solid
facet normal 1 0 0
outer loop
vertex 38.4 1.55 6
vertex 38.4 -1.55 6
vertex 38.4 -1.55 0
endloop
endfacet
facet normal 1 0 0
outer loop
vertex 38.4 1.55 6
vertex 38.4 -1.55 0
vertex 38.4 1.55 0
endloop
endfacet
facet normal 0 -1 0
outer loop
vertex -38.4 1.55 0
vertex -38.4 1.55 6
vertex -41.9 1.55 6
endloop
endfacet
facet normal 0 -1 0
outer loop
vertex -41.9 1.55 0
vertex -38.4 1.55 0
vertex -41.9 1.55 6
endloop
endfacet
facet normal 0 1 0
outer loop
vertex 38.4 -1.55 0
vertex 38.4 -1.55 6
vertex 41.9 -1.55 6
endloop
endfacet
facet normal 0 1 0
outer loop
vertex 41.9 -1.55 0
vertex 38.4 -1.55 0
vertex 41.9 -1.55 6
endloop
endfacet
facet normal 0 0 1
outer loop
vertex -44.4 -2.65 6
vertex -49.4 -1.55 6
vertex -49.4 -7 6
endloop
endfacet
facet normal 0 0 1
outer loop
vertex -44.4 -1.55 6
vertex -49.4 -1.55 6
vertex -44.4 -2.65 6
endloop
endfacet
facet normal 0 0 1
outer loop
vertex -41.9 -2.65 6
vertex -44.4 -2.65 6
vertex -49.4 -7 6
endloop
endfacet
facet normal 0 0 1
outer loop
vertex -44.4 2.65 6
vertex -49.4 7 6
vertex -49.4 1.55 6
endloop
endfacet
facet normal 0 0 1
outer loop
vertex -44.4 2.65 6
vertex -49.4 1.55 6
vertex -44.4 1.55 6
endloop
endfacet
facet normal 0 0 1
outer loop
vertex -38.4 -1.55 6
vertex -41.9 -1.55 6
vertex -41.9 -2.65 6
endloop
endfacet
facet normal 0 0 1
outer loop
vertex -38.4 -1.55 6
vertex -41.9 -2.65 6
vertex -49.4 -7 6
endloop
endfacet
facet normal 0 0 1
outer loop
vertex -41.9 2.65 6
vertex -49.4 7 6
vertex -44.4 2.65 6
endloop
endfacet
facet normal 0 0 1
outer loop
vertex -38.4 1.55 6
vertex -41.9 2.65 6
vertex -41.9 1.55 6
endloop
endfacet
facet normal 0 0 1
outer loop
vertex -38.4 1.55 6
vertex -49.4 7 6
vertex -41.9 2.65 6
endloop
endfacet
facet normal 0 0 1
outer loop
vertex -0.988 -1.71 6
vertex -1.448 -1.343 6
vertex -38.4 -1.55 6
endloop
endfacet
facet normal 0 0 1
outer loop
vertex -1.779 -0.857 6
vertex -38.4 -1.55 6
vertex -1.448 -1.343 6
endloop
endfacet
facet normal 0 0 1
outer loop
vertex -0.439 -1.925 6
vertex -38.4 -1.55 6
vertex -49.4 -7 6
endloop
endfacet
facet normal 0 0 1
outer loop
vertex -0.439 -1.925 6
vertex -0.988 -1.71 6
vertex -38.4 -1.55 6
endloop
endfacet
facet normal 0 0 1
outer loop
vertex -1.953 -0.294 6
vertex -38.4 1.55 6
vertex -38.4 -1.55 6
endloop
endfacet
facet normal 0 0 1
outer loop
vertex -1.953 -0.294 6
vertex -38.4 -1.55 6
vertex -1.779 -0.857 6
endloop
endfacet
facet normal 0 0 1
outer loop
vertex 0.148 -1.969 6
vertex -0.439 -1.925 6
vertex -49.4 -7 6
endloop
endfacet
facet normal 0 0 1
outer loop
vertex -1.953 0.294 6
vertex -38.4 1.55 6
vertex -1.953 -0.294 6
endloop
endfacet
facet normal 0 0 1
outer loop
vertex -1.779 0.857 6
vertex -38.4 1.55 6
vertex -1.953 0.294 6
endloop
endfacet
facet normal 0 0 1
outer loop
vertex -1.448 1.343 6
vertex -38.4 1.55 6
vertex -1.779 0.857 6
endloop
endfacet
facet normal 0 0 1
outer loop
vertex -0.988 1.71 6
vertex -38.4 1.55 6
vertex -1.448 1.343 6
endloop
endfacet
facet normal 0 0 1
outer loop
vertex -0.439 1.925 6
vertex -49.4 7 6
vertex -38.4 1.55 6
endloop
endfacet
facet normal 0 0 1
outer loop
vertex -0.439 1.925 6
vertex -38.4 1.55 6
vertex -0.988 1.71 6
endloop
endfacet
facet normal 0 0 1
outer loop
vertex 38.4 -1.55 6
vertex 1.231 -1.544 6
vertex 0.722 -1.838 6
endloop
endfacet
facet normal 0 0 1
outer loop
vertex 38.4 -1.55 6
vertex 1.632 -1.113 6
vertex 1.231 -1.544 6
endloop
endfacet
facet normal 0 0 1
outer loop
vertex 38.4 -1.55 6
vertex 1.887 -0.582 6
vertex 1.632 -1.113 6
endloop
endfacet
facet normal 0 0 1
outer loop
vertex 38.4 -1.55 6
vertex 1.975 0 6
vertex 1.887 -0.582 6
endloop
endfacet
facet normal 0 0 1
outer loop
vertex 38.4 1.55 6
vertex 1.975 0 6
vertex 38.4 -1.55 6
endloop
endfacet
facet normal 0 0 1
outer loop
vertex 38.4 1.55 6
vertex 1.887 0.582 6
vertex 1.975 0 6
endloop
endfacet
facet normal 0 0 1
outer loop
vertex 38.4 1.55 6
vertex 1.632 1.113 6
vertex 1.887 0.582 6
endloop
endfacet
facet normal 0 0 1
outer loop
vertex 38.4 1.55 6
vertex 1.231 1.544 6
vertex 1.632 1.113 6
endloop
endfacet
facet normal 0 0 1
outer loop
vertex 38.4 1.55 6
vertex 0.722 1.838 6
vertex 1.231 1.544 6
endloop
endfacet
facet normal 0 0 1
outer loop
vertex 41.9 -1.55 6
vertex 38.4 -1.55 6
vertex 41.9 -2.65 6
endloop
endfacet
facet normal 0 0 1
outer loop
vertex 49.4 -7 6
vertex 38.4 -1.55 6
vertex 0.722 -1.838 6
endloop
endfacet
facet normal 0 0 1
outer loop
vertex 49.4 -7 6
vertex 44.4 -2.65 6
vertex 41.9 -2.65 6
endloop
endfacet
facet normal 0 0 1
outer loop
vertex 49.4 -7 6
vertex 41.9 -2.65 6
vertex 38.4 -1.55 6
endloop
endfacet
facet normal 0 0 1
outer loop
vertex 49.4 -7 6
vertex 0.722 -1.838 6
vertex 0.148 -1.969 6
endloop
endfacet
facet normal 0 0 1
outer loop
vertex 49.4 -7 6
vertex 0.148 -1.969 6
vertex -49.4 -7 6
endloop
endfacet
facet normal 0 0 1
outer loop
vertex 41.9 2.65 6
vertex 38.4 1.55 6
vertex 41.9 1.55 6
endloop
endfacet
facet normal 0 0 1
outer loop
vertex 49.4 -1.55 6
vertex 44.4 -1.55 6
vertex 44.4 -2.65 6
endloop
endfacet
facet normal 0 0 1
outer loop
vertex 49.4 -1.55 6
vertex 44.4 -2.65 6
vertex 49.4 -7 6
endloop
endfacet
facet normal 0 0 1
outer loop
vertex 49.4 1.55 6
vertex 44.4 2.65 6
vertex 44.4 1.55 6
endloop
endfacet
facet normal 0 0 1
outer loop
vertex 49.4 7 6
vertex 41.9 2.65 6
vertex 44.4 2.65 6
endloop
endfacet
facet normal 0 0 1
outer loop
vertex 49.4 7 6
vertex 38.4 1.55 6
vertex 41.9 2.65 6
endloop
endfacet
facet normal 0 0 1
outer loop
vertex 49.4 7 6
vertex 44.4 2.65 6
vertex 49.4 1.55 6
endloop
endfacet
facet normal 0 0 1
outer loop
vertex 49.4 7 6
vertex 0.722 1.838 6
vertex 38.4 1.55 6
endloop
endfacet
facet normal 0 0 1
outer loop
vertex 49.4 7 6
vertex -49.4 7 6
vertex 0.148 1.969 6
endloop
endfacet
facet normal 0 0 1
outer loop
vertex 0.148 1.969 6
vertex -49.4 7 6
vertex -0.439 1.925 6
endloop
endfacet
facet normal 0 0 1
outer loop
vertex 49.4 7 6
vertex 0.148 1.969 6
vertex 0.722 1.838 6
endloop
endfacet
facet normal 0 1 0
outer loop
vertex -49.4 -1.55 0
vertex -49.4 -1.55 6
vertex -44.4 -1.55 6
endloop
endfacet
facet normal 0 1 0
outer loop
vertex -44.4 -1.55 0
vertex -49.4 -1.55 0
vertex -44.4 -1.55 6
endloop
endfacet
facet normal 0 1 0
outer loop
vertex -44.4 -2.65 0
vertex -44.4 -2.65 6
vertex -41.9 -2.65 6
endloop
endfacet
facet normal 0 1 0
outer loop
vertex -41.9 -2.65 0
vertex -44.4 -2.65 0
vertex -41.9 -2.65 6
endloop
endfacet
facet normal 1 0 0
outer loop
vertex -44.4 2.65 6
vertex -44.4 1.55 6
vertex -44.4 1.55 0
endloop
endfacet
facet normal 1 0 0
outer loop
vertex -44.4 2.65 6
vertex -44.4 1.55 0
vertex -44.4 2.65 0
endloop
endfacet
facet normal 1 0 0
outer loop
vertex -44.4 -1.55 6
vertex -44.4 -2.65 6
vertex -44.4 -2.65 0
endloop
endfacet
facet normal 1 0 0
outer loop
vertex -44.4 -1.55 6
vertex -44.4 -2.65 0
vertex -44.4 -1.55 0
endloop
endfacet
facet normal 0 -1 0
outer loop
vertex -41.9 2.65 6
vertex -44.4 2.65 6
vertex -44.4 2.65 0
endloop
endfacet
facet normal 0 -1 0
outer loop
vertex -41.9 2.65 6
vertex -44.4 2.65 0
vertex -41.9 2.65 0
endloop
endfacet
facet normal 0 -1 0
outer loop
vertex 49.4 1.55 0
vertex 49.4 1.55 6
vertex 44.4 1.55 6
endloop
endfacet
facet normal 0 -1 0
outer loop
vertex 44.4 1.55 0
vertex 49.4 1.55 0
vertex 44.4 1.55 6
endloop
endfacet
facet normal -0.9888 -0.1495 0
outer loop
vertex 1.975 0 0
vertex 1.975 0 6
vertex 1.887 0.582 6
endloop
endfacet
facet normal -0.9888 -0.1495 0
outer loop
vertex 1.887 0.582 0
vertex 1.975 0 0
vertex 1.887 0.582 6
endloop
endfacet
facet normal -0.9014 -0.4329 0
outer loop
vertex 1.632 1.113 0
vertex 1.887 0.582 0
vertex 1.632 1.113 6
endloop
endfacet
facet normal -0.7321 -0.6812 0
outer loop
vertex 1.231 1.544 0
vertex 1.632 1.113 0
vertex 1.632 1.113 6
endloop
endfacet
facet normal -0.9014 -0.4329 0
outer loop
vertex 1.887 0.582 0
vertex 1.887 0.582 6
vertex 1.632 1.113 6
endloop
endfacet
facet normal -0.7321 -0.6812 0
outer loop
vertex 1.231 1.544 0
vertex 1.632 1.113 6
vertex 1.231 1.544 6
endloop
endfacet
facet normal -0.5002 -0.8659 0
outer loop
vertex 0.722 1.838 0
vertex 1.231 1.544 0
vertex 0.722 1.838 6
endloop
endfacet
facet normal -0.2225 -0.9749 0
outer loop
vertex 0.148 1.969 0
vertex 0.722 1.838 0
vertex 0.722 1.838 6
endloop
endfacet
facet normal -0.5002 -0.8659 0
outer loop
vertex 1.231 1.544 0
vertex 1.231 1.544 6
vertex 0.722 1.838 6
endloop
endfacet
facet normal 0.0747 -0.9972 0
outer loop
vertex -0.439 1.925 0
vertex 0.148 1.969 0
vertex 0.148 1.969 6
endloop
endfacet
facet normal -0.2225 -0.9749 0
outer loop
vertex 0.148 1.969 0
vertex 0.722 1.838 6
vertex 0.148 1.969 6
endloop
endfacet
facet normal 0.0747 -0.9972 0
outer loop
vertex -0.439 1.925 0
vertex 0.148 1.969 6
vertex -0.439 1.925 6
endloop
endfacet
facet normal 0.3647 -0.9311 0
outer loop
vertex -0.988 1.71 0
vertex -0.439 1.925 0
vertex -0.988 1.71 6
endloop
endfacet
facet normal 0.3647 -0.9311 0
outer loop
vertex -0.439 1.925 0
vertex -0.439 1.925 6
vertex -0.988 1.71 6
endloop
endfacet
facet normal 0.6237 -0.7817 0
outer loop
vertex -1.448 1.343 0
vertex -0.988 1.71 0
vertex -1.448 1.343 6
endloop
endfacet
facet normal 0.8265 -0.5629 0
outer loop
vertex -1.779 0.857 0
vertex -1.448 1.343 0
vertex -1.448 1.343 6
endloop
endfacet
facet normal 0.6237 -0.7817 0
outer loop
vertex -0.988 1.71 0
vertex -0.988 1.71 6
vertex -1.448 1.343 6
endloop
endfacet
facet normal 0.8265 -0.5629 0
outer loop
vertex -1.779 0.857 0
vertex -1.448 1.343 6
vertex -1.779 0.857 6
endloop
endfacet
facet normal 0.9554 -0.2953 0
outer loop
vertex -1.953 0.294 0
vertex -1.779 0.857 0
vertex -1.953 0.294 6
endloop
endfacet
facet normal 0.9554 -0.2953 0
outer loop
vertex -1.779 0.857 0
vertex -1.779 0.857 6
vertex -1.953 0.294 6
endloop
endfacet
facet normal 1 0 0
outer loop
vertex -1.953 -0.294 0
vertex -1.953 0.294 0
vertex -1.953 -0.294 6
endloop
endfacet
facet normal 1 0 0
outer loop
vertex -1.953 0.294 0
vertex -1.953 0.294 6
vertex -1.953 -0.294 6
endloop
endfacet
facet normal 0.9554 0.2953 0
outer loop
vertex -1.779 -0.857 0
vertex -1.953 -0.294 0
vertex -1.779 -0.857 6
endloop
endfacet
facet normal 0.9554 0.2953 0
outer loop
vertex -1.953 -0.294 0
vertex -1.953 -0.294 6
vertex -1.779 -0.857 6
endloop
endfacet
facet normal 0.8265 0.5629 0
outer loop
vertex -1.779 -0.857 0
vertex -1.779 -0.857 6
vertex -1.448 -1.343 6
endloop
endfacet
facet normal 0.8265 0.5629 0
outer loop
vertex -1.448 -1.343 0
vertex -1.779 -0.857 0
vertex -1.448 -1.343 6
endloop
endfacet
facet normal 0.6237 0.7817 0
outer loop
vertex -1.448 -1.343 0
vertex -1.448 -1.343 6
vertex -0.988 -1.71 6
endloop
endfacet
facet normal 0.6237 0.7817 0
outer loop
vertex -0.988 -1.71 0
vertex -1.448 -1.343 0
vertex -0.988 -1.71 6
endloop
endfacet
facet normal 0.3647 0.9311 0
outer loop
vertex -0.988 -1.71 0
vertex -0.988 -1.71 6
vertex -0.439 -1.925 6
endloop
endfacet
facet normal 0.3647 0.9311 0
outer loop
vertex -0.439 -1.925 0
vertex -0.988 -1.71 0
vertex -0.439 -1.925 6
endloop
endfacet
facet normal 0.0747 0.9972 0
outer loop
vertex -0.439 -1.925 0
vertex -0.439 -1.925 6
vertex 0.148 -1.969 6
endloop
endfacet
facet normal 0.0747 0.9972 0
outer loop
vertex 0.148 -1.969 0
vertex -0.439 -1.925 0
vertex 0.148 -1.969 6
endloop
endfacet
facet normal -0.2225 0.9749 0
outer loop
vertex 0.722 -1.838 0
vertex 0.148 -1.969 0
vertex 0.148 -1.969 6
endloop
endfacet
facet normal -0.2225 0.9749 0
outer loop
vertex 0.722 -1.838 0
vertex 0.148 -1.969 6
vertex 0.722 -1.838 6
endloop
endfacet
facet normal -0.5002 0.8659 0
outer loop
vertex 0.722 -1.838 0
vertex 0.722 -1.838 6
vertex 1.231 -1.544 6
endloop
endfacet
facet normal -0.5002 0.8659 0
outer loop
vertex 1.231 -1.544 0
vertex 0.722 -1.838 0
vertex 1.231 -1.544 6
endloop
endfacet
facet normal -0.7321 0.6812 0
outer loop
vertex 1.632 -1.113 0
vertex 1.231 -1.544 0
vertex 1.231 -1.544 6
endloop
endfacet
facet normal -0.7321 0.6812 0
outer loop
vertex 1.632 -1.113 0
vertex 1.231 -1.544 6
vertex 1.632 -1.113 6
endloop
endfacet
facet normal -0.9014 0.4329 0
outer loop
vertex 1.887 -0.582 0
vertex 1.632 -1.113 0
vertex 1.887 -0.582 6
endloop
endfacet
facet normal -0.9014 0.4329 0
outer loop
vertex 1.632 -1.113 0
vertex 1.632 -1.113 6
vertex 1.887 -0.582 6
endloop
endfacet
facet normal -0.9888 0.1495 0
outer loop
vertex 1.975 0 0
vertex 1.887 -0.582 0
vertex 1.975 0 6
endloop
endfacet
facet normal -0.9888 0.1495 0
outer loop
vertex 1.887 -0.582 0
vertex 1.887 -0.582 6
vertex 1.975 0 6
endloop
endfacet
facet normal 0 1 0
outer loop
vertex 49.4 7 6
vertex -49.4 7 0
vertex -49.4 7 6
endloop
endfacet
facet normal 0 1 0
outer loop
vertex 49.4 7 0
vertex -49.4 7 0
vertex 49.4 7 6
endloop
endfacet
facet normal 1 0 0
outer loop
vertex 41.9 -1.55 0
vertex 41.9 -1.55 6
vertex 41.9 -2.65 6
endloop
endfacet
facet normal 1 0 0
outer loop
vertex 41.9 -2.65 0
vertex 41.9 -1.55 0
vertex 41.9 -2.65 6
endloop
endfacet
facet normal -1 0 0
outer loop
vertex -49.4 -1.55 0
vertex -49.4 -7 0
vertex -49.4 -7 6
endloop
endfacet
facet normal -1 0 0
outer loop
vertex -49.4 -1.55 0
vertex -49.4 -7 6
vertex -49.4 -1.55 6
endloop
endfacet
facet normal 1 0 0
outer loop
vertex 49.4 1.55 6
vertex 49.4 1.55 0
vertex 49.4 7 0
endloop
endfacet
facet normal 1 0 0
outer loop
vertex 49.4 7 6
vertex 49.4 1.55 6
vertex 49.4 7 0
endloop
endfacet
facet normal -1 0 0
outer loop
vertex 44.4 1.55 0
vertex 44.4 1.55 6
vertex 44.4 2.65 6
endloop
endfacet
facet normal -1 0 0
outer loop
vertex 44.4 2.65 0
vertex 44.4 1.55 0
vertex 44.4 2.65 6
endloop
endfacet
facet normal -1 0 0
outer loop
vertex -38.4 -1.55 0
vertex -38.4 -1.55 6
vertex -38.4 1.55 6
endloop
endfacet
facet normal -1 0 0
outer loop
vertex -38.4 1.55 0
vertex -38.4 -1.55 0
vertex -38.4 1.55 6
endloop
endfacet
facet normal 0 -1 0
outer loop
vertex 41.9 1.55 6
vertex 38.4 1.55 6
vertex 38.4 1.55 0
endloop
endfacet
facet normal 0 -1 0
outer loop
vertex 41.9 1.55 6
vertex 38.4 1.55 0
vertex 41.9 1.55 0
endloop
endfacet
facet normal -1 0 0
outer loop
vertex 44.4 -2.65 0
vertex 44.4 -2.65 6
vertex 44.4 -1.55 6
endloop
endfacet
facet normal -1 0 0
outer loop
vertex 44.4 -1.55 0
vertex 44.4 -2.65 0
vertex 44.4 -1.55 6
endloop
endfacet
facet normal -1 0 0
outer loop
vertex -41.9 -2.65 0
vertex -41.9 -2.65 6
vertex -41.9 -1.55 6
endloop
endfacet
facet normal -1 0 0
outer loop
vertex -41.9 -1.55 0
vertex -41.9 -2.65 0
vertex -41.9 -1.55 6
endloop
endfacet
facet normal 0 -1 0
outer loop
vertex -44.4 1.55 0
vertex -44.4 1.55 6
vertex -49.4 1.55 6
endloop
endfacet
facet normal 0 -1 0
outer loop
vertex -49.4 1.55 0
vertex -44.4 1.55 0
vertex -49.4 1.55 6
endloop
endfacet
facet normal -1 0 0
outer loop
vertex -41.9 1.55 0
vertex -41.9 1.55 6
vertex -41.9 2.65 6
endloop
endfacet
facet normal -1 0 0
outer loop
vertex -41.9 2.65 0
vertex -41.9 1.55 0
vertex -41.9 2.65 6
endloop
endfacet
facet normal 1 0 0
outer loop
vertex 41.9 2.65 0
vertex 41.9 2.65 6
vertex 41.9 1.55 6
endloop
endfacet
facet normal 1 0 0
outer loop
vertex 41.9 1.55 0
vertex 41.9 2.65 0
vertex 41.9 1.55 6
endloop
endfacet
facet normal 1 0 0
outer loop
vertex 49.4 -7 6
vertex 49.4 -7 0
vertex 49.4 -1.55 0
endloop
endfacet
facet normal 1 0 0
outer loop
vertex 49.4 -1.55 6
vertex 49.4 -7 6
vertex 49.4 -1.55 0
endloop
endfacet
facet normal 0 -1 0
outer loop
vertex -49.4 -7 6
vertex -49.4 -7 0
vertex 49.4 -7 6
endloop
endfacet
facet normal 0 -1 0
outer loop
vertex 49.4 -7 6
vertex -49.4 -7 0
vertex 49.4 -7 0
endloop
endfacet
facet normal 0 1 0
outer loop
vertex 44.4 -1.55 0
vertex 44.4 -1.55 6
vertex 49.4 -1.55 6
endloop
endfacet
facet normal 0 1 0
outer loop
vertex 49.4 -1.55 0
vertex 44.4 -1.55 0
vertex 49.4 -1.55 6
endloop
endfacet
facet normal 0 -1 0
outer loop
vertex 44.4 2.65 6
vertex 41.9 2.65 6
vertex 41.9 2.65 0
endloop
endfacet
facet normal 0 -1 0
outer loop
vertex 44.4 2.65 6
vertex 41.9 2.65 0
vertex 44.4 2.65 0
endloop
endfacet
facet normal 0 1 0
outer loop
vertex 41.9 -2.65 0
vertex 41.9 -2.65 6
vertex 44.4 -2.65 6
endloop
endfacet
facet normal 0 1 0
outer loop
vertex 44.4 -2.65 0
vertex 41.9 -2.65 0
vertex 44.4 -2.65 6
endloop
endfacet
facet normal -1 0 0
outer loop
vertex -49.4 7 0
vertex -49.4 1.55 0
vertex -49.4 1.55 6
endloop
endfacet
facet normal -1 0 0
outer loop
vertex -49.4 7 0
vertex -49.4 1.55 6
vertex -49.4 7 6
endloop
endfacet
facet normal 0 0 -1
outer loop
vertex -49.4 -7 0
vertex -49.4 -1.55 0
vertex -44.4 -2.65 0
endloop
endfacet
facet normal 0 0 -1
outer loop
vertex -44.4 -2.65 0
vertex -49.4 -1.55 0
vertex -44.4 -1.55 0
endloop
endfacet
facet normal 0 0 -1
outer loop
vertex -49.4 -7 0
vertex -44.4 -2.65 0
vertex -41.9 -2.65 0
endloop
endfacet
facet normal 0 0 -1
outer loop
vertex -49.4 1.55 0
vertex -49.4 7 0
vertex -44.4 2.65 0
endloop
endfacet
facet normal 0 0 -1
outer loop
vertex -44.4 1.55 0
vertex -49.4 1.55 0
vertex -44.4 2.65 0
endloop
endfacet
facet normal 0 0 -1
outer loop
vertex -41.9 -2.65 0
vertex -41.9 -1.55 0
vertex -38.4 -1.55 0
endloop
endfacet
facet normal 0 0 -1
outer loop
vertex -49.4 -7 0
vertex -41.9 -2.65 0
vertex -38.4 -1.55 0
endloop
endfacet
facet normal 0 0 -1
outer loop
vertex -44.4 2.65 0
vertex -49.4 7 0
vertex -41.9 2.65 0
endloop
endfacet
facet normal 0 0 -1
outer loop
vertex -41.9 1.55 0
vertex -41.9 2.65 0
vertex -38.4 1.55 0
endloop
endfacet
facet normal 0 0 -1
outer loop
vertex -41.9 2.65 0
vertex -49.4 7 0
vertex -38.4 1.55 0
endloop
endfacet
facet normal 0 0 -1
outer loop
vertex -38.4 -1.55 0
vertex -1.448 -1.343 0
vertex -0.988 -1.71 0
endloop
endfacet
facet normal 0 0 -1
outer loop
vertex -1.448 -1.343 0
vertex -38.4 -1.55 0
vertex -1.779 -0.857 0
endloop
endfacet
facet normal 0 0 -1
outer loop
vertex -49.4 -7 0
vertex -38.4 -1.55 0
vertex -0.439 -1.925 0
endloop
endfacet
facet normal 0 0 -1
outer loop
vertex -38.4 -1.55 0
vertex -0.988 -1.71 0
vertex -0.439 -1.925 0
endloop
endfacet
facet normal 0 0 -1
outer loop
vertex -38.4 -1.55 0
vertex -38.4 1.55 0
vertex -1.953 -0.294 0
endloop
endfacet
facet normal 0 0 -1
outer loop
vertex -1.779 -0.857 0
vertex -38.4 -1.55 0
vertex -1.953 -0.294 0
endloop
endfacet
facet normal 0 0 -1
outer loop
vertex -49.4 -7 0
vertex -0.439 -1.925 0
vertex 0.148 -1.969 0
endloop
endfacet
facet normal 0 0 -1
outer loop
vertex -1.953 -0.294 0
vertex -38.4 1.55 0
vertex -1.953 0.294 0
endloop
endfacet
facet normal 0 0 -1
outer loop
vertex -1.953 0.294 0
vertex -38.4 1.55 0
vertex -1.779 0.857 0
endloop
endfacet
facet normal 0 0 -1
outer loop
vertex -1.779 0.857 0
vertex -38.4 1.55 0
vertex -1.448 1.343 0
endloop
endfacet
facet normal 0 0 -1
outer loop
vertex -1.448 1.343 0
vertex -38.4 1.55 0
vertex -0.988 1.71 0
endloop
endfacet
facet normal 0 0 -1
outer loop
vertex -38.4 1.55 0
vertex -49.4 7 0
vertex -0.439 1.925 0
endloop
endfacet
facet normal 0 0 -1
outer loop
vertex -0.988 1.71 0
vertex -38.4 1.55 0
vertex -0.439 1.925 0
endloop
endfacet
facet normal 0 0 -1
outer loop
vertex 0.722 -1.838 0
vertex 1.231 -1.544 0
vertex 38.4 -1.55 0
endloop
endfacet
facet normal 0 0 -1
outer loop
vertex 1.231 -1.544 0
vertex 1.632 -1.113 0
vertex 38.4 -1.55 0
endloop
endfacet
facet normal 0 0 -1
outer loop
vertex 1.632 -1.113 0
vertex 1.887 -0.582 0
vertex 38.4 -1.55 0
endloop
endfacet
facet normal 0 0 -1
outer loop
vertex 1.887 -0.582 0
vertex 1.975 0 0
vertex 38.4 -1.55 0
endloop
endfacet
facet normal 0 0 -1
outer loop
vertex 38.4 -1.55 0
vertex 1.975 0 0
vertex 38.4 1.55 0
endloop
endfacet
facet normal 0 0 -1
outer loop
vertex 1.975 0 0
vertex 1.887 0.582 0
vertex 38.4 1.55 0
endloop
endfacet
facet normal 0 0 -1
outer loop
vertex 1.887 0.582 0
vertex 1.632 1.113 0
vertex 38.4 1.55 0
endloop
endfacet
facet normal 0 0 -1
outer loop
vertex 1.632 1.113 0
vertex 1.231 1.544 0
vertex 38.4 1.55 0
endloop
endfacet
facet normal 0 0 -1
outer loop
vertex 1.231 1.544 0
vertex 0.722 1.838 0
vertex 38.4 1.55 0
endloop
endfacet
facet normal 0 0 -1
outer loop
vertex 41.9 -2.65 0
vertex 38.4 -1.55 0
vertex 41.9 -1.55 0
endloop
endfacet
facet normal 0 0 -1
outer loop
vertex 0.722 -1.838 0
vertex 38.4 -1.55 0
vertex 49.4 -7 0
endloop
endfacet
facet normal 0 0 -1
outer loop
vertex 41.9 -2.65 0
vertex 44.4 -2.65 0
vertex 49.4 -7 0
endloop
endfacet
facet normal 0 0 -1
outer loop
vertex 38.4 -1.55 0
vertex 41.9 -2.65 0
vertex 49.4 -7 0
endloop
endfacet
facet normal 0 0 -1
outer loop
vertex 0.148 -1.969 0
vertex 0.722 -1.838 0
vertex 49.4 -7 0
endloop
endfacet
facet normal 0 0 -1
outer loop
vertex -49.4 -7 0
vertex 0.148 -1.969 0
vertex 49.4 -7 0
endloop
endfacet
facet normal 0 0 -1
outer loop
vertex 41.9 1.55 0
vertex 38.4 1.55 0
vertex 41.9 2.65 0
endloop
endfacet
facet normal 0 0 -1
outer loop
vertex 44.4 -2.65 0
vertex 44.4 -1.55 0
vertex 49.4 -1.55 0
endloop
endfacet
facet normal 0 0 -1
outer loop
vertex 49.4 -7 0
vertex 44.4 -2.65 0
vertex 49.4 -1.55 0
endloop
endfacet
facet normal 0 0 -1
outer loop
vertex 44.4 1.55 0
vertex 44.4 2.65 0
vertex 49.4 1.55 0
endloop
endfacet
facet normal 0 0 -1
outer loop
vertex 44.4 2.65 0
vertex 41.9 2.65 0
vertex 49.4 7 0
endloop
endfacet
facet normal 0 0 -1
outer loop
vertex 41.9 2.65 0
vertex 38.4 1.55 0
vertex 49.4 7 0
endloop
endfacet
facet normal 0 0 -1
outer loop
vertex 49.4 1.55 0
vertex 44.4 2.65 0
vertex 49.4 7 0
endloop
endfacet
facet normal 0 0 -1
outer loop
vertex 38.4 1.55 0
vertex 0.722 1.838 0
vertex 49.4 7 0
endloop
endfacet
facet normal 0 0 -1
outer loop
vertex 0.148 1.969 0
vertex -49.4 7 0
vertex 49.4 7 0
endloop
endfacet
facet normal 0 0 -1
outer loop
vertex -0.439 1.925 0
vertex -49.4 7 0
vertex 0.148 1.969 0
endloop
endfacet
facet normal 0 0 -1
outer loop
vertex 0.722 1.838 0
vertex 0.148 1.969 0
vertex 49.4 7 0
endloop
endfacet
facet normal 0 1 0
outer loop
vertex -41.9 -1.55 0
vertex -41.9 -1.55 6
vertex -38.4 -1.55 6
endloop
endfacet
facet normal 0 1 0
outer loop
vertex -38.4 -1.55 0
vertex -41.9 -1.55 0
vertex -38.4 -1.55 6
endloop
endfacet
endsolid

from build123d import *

# Parameters (mm, degrees)
F0_W     = 98.8
F0_H     = 14
F1_DEPTH = 6
F2_W     = 5
F2_H     = 3.1
F2_W_2   = 2.5
F2_H_2   = 1.1
F2_W_3   = 3.5
F3_DEPTH = 6
F4_R     = 1.975
F5_DEPTH = 6


with BuildPart() as f1:
    # F0 (on Top) → F1 (new body)
    with BuildSketch(Plane.XY):
        Rectangle(F0_W, F0_H)
    extrude(amount=F1_DEPTH)

    # F2 (on face) → F3 (cut, through all)
    with BuildSketch(Plane.XY.offset(6)):
        with Locations((-46.9, 0)):
            Rectangle(F2_W, F2_H)
        with Locations((-43.15, 0)):
            Rectangle(F2_W_2, F2_H)
        with Locations((-43.15, -2.1)):
            Rectangle(F2_W_2, F2_H_2)
        with Locations((-40.15, 0)):
            Rectangle(F2_W_3, F2_H)
        with Locations((-43.15, 2.1)):
            Rectangle(F2_W_2, F2_H_2)
        with Locations((46.9, 0)):
            Rectangle(F2_W, F2_H)
        with Locations((43.15, 0)):
            Rectangle(F2_W_2, F2_H)
        with Locations((43.15, -2.1)):
            Rectangle(F2_W_2, F2_H_2)
        with Locations((43.15, 2.1)):
            Rectangle(F2_W_2, F2_H_2)
        with Locations((40.15, 0)):
            Rectangle(F2_W_3, F2_H)
    extrude(amount=-F3_DEPTH, mode=Mode.SUBTRACT)

    # F4 (on face) → F5 (cut, through all)
    with BuildSketch(Plane.XY.offset(6)):
        Circle(F4_R)
    extrude(amount=-F5_DEPTH, mode=Mode.SUBTRACT)


solid = f1.part
